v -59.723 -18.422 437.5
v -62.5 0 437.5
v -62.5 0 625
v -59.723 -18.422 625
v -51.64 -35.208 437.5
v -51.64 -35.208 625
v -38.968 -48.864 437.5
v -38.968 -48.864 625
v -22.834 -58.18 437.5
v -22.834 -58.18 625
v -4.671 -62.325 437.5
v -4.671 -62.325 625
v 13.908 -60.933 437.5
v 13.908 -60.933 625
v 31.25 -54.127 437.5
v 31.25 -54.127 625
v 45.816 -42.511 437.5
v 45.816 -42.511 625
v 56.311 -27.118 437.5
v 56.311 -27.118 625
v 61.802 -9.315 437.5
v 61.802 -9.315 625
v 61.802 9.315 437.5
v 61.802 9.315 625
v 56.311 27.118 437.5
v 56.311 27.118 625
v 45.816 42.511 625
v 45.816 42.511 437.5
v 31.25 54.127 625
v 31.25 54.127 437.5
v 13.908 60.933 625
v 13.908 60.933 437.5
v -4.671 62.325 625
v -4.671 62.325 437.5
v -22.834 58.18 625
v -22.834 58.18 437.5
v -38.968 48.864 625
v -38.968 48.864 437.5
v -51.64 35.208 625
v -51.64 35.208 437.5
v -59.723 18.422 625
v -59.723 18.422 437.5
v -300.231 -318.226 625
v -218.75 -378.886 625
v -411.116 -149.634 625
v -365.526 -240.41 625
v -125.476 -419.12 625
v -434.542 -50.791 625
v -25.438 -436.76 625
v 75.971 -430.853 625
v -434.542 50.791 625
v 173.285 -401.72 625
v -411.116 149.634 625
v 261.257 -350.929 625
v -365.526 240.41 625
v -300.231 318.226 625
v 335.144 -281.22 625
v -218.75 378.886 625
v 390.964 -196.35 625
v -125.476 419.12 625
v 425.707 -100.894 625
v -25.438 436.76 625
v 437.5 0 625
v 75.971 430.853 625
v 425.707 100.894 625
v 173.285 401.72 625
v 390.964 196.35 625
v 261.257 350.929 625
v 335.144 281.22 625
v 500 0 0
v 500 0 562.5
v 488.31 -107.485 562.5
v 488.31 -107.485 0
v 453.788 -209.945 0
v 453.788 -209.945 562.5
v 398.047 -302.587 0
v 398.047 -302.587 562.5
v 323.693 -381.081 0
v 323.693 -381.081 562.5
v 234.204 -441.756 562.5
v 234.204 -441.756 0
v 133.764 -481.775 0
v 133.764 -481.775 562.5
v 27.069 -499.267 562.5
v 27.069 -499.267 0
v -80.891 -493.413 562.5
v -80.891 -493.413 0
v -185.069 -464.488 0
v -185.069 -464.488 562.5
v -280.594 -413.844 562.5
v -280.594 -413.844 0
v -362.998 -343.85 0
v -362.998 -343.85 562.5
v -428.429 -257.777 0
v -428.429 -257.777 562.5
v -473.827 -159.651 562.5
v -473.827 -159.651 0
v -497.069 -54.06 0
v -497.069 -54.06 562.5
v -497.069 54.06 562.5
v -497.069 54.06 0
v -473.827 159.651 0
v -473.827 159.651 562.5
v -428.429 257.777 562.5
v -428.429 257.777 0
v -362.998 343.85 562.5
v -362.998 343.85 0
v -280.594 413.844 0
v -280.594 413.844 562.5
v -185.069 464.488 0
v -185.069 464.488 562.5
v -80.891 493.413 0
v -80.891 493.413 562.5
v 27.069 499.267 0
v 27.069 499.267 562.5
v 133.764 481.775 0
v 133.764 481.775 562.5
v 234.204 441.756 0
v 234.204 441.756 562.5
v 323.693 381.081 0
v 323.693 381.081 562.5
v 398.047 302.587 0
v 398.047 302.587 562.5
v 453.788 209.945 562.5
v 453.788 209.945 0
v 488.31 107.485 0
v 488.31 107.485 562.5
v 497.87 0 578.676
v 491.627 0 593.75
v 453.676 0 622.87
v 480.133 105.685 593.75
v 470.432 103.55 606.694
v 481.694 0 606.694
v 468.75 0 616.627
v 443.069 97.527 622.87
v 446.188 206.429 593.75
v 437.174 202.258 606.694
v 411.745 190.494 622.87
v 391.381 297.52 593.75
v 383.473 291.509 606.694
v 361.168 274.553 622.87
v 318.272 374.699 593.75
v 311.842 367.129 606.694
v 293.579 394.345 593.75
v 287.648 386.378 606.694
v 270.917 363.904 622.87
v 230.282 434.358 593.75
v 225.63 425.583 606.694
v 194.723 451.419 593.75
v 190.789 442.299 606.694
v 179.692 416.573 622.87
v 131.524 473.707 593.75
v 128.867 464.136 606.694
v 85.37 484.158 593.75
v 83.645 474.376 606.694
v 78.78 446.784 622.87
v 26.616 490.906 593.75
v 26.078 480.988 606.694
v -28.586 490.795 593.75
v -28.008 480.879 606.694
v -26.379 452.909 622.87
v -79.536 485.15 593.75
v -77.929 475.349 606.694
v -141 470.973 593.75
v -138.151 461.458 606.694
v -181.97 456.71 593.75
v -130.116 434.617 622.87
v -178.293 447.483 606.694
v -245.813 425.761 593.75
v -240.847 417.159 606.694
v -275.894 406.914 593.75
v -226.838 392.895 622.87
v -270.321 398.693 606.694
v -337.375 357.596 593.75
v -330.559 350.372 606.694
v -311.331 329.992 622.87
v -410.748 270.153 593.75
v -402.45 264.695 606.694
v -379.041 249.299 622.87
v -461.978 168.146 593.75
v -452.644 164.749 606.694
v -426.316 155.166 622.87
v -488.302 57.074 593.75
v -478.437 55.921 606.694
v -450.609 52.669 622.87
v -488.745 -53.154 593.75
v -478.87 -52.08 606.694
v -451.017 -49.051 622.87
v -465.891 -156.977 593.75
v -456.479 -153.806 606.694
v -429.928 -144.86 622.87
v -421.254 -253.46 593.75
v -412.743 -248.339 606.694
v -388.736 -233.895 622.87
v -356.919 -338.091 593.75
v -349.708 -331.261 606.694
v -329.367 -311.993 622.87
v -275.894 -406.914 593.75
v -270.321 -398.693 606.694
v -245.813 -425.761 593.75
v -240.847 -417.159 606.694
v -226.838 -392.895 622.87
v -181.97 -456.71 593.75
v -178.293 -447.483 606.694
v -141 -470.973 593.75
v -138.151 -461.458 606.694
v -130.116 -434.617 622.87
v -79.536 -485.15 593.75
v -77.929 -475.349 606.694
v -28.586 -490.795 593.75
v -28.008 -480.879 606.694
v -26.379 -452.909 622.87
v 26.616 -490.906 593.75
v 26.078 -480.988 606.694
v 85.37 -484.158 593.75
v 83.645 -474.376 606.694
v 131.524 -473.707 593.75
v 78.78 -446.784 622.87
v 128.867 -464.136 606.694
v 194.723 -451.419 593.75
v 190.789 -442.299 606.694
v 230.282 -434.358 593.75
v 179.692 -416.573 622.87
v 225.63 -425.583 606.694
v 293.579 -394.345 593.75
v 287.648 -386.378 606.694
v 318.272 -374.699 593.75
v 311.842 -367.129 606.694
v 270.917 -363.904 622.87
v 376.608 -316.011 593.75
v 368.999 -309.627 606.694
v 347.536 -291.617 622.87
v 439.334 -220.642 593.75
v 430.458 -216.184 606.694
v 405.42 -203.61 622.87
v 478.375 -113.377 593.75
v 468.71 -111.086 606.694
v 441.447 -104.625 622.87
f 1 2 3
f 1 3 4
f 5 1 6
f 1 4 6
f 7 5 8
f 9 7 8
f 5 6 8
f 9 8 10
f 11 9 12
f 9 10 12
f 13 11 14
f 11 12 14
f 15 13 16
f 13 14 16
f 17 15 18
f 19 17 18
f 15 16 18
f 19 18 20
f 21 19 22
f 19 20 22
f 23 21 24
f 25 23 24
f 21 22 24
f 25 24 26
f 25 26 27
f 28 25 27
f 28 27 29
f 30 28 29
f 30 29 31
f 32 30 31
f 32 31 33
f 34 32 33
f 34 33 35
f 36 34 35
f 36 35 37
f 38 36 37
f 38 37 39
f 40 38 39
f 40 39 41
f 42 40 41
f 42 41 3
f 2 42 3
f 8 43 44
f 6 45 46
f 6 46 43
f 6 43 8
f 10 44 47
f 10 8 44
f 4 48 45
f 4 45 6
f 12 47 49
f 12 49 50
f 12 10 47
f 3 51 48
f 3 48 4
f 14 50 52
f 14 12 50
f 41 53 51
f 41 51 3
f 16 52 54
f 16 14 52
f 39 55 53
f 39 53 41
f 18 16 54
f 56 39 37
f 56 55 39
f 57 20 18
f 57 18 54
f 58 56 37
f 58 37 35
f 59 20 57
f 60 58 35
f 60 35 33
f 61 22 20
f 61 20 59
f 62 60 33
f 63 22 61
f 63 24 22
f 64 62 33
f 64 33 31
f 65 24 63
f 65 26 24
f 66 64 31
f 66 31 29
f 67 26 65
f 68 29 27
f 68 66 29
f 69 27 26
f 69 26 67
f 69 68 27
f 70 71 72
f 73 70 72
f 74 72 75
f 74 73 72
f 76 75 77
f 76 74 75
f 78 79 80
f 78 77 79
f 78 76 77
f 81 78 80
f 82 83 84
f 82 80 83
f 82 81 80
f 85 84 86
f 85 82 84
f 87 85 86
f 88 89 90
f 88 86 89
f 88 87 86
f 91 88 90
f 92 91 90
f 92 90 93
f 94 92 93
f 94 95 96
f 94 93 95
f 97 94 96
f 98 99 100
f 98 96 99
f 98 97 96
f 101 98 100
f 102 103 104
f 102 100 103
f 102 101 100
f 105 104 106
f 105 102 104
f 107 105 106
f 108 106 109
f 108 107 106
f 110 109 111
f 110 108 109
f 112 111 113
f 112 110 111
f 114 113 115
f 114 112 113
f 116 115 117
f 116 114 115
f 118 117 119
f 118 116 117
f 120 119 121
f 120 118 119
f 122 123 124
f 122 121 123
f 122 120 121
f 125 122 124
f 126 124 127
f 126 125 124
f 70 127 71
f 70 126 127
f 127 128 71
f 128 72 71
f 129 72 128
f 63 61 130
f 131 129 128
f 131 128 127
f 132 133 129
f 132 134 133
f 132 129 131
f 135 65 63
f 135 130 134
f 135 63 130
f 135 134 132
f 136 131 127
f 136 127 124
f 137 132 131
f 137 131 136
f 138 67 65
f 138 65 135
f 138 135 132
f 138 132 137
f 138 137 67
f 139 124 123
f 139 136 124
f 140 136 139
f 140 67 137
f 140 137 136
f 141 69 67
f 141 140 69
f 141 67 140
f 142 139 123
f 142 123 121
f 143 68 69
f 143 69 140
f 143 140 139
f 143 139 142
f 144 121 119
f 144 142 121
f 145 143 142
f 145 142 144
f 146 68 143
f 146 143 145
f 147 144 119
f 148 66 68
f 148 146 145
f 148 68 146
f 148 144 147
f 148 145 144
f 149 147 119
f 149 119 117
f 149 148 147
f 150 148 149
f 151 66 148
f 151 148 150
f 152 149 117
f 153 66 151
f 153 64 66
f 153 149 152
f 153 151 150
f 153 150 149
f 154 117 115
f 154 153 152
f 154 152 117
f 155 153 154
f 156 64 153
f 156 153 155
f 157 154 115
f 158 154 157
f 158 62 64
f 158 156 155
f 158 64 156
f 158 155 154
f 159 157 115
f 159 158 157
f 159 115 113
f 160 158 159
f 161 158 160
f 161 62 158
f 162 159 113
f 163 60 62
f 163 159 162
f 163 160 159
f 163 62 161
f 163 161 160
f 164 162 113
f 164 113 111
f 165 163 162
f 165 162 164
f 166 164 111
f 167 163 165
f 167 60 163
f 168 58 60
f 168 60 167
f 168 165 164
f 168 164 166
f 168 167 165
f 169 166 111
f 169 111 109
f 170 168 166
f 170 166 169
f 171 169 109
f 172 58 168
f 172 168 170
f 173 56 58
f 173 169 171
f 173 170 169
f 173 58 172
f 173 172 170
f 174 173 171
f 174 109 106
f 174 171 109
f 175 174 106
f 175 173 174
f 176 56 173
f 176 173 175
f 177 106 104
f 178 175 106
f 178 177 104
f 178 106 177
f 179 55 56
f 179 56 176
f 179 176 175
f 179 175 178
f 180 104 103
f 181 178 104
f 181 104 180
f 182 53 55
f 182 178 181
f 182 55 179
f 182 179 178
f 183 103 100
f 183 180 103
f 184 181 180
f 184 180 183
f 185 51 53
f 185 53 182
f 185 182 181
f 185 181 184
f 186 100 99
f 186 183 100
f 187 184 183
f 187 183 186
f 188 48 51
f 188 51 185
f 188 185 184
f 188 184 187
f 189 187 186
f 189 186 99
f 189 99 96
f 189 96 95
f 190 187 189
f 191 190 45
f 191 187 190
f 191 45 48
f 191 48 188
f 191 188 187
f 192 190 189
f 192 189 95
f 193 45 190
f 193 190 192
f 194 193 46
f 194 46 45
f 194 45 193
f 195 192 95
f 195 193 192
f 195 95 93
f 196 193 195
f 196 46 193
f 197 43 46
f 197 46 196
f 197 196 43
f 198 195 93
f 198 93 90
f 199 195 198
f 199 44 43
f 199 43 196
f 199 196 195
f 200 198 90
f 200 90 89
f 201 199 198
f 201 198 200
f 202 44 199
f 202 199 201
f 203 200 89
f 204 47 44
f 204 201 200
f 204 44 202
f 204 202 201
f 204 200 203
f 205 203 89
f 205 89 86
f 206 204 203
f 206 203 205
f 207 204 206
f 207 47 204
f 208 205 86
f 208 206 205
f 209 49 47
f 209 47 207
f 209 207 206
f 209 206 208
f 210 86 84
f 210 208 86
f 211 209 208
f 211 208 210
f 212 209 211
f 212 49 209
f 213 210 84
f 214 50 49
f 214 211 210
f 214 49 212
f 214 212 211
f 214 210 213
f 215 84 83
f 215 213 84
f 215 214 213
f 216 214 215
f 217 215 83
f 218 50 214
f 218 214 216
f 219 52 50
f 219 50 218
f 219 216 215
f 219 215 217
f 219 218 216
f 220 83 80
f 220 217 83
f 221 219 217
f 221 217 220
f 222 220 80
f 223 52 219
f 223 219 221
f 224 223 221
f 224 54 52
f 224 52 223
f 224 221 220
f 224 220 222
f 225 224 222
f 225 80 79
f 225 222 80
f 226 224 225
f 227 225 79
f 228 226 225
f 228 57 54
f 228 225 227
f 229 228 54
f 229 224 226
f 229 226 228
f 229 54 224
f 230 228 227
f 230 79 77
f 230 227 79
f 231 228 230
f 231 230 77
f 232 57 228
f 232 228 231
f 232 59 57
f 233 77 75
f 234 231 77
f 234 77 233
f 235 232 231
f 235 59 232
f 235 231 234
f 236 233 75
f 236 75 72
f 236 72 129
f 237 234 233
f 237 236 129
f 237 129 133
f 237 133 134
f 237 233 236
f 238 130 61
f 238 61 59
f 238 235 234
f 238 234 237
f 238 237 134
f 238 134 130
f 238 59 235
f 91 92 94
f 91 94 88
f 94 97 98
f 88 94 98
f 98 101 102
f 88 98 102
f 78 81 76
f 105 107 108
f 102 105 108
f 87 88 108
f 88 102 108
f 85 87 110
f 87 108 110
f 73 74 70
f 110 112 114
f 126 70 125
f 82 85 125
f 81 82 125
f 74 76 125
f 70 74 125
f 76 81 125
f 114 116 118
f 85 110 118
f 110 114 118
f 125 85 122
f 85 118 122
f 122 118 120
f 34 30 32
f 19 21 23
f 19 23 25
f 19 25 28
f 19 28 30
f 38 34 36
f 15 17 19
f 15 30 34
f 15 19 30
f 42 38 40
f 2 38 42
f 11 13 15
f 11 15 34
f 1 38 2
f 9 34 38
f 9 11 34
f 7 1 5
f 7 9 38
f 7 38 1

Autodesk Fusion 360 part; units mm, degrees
sketch "Sketch1" plane through (0, 0, 0) normal (0, 0, 1) x (1, 0, 0)
  circle A0 centre (0, 0) radius 200
  dimension "d1" = 400
extrude "Extrude1" add sketch "Sketch1" along normal blind 250
sketch "Sketch2" plane through (0, 0, 250) normal (0, 0, 1) x (-1, 0, 0)
  circle A0 centre (0, 0) radius 200
  circle A1 centre (0, 0) radius 25
  dimension "d4" = 50
extrude "Extrude2" cut sketch "Sketch2" against normal blind 75 contours A1
fillet "Fillet1" radius 25 1 edges at (-186.4655, -72.3231, 250)
scale "Scale1" factor 2.5 about (0, 0, 0) bodies 1
